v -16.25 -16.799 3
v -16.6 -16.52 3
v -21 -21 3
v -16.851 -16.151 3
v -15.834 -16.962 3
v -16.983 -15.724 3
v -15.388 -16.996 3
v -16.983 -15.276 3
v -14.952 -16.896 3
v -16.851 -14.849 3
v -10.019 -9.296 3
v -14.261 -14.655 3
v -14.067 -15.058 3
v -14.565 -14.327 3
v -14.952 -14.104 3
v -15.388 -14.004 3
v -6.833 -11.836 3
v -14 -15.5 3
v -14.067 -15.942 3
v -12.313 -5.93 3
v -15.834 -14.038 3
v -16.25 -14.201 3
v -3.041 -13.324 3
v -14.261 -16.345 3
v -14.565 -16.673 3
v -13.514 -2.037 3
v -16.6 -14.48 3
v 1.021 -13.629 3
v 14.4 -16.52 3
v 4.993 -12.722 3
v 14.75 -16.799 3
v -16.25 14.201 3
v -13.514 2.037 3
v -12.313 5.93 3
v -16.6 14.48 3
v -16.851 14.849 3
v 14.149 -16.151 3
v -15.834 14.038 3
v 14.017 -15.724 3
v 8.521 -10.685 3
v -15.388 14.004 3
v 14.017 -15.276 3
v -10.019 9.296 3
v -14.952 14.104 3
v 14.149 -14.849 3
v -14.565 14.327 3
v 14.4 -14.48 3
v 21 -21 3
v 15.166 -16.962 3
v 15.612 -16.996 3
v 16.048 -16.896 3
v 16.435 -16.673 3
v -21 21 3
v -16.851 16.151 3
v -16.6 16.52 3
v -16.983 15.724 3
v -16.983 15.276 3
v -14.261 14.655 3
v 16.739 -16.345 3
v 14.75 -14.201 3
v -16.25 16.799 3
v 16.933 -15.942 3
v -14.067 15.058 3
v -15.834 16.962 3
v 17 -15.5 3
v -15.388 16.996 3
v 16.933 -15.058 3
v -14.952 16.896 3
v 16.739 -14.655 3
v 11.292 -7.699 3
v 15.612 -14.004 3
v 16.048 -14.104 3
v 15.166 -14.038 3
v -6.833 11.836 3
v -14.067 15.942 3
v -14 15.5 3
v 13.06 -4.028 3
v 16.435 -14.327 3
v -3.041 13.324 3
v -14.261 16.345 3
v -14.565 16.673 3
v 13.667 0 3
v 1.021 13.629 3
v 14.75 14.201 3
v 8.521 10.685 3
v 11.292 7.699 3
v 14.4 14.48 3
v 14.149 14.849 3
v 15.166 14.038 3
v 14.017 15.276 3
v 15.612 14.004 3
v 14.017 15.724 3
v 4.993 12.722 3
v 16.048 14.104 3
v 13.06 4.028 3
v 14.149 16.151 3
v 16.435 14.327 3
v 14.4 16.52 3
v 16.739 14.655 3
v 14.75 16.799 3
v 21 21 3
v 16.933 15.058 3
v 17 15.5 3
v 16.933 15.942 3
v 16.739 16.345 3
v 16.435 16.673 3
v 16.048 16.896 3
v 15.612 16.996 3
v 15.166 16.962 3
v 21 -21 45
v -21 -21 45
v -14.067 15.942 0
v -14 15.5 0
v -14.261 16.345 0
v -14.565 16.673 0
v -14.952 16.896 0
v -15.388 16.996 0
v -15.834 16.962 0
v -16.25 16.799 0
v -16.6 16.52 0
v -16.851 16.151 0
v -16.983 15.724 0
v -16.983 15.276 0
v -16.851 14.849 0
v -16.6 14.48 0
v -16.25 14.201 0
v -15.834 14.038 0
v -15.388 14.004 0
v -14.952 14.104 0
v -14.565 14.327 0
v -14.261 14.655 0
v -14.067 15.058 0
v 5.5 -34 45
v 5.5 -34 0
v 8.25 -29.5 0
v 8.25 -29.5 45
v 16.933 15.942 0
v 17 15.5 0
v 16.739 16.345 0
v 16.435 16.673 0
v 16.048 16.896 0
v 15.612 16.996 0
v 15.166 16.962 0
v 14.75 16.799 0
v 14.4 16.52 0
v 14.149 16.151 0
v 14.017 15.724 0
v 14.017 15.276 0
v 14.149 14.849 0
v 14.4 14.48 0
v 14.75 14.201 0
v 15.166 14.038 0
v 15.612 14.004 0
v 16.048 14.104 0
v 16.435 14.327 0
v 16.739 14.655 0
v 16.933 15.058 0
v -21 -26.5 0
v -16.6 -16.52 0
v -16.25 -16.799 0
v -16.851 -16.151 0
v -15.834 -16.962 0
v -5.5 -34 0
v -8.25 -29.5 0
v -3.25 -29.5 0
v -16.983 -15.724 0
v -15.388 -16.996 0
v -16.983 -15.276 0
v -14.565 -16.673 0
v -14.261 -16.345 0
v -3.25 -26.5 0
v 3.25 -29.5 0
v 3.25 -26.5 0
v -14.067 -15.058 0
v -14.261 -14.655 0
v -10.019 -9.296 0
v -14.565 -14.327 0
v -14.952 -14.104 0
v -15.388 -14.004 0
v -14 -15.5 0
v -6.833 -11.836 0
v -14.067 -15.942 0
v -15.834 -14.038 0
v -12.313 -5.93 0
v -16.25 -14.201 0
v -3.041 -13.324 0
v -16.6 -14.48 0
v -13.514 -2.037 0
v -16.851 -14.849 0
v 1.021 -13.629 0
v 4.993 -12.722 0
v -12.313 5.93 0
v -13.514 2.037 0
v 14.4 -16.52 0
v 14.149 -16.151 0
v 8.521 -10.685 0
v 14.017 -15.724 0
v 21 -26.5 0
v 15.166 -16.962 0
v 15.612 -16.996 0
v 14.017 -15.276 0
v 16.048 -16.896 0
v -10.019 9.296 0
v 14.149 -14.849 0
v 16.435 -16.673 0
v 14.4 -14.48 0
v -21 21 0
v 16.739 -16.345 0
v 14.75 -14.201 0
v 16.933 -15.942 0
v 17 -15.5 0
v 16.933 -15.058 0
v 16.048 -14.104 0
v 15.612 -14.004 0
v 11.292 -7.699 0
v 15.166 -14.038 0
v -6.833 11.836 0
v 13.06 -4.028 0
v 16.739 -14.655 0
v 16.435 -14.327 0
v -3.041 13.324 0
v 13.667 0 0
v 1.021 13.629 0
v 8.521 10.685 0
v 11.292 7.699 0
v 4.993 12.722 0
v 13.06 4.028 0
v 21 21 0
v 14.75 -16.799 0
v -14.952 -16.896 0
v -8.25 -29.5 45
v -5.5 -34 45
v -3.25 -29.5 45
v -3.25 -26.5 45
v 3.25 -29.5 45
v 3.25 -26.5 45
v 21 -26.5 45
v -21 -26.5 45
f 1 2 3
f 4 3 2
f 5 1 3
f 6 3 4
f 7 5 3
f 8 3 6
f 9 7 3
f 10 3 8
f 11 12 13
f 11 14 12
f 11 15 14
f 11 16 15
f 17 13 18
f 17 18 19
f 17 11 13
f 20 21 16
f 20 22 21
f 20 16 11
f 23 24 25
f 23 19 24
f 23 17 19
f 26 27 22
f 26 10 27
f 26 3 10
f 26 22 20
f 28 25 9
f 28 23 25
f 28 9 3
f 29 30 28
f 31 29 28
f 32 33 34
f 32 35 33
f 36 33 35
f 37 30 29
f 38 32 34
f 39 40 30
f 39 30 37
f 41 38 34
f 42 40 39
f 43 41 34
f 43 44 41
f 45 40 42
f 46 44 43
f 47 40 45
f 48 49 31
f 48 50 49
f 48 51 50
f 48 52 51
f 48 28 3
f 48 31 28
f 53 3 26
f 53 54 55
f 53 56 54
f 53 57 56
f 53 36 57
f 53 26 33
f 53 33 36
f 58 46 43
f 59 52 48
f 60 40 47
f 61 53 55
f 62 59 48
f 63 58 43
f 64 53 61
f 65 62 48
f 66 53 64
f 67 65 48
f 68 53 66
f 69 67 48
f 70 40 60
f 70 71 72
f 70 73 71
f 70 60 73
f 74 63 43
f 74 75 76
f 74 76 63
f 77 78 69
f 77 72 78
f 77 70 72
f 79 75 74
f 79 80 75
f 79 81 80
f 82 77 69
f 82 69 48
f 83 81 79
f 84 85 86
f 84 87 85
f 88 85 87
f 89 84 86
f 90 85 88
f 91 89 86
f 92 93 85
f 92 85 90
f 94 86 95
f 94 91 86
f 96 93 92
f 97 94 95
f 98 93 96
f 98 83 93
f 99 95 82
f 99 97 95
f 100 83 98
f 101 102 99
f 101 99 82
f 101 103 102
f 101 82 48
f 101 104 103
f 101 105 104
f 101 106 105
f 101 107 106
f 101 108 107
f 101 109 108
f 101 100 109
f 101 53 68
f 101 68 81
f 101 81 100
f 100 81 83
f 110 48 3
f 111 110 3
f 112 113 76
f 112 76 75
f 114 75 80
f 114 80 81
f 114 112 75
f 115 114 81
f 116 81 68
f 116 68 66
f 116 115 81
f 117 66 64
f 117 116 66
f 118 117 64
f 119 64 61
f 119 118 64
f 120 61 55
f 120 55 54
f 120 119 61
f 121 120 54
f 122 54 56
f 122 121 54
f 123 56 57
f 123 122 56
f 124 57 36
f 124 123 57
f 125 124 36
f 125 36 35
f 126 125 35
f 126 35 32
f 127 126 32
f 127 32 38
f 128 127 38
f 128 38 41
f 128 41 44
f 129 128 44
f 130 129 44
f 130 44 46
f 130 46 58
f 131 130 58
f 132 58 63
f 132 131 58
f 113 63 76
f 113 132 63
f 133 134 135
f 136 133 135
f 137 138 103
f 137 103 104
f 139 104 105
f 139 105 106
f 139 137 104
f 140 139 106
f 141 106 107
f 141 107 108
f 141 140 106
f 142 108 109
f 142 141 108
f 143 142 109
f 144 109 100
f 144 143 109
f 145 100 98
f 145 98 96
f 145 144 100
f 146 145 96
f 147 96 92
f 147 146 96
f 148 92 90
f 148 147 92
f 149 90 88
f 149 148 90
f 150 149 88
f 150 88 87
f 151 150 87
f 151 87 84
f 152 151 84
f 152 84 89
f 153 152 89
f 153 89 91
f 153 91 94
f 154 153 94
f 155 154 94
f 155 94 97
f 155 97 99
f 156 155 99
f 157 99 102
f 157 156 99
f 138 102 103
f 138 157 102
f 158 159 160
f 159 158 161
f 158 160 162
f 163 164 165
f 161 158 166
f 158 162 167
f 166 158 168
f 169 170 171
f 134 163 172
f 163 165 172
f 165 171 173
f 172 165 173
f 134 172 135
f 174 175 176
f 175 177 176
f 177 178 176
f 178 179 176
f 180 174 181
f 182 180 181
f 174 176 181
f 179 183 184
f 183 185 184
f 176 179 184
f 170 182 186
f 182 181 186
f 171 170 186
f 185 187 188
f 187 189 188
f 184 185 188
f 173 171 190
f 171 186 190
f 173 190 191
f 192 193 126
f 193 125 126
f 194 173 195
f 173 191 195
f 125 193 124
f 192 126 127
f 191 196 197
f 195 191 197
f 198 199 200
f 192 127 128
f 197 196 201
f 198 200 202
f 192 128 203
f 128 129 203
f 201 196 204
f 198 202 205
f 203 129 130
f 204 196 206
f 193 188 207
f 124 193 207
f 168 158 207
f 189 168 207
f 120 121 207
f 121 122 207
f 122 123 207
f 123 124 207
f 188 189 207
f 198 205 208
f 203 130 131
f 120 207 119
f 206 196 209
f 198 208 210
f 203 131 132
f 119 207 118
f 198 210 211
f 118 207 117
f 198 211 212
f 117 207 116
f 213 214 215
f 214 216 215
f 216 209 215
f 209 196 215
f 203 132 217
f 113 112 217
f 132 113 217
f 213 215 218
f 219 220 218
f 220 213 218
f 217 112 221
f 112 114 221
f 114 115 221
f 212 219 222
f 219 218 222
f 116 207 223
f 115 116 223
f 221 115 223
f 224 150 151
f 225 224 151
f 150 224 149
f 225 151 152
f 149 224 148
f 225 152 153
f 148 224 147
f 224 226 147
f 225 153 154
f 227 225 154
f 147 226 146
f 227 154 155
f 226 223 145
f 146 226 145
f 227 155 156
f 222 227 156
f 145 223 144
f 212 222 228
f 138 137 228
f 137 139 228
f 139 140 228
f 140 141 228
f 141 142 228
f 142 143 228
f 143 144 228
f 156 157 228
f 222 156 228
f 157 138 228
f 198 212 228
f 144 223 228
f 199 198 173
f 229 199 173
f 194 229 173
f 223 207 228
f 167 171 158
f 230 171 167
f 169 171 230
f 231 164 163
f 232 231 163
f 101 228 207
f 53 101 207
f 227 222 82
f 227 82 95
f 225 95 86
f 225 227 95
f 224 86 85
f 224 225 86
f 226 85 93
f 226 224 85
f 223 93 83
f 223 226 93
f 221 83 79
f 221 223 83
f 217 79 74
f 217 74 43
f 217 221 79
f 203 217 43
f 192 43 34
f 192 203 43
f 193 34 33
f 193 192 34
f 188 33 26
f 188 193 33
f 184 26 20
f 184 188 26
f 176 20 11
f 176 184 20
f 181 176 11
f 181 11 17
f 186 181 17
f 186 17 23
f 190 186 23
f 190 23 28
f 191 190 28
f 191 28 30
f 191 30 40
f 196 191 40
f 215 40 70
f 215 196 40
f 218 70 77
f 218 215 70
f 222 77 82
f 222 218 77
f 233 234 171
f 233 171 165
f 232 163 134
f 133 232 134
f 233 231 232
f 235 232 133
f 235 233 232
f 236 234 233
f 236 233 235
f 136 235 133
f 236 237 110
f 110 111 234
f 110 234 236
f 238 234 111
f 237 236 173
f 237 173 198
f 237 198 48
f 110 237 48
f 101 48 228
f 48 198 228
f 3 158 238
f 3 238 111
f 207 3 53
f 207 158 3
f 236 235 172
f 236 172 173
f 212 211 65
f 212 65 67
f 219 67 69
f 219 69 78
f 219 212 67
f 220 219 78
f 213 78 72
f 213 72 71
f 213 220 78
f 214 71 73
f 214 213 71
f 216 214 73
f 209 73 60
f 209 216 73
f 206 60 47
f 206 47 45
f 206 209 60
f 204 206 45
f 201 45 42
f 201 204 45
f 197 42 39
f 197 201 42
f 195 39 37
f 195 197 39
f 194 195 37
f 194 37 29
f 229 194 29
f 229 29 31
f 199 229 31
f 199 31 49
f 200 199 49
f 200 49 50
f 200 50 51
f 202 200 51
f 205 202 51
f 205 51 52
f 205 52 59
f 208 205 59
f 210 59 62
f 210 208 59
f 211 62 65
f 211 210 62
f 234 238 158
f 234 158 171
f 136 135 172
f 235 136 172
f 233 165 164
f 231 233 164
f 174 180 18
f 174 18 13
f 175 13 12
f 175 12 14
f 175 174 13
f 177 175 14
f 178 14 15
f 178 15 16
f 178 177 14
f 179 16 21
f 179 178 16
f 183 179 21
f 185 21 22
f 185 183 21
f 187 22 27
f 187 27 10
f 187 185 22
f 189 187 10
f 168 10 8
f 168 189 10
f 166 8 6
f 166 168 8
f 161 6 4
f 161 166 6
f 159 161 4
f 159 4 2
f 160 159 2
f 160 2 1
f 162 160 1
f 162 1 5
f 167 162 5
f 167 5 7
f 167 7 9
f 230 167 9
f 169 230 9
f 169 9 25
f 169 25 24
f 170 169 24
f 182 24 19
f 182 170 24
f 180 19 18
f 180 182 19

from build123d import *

# Parameters (mm, degrees)
F0_R     = 1.5
F0_R_2   = 13.666943
F1_DEPTH = 3
F0_W     = 3.25
F0_H     = 5.5
F0_W_2   = 17.75
F2_DEPTH = 45


with BuildPart() as f1:
    # F0 (on Top) → F1 (new body)
    with BuildSketch(Plane.XY):
        Polygon((21, 21), (-21, 21), (-21, -21), (-3.25, -21), (0, -21), (3.25, -21), (21, -21), align=None)
        with Locations((-15.5, -15.5)):
            Circle(F0_R, mode=Mode.SUBTRACT)
        with Locations((15.5, -15.5)):
            Circle(F0_R, mode=Mode.SUBTRACT)
        with Locations((-15.5, 15.5)):
            Circle(F0_R, mode=Mode.SUBTRACT)
        Circle(F0_R_2, mode=Mode.SUBTRACT)
        with Locations((15.5, 15.5)):
            Circle(F0_R, mode=Mode.SUBTRACT)
    extrude(amount=F1_DEPTH)

    # F0 (on Top) → F2 (join)
    with BuildSketch(Plane.XY):
        Polygon((0, -26.5), (-3.25, -26.5), (-3.25, -29.5), (-8.25, -29.5), (-5.5, -34), (0, -34), align=None)
        Polygon((3.25, -29.5), (3.25, -26.5), (0, -26.5), (0, -34), (5.5, -34), (8.25, -29.5), align=None)
        with Locations((1.625, -23.75)):
            Rectangle(F0_W, F0_H)
        with Locations((12.125, -23.75)):
            Rectangle(F0_W_2, F0_H)
        with Locations((-1.625, -23.75)):
            Rectangle(F0_W, F0_H)
        with Locations((-12.125, -23.75)):
            Rectangle(F0_W_2, F0_H)
    extrude(amount=F2_DEPTH)


solid = f1.part
